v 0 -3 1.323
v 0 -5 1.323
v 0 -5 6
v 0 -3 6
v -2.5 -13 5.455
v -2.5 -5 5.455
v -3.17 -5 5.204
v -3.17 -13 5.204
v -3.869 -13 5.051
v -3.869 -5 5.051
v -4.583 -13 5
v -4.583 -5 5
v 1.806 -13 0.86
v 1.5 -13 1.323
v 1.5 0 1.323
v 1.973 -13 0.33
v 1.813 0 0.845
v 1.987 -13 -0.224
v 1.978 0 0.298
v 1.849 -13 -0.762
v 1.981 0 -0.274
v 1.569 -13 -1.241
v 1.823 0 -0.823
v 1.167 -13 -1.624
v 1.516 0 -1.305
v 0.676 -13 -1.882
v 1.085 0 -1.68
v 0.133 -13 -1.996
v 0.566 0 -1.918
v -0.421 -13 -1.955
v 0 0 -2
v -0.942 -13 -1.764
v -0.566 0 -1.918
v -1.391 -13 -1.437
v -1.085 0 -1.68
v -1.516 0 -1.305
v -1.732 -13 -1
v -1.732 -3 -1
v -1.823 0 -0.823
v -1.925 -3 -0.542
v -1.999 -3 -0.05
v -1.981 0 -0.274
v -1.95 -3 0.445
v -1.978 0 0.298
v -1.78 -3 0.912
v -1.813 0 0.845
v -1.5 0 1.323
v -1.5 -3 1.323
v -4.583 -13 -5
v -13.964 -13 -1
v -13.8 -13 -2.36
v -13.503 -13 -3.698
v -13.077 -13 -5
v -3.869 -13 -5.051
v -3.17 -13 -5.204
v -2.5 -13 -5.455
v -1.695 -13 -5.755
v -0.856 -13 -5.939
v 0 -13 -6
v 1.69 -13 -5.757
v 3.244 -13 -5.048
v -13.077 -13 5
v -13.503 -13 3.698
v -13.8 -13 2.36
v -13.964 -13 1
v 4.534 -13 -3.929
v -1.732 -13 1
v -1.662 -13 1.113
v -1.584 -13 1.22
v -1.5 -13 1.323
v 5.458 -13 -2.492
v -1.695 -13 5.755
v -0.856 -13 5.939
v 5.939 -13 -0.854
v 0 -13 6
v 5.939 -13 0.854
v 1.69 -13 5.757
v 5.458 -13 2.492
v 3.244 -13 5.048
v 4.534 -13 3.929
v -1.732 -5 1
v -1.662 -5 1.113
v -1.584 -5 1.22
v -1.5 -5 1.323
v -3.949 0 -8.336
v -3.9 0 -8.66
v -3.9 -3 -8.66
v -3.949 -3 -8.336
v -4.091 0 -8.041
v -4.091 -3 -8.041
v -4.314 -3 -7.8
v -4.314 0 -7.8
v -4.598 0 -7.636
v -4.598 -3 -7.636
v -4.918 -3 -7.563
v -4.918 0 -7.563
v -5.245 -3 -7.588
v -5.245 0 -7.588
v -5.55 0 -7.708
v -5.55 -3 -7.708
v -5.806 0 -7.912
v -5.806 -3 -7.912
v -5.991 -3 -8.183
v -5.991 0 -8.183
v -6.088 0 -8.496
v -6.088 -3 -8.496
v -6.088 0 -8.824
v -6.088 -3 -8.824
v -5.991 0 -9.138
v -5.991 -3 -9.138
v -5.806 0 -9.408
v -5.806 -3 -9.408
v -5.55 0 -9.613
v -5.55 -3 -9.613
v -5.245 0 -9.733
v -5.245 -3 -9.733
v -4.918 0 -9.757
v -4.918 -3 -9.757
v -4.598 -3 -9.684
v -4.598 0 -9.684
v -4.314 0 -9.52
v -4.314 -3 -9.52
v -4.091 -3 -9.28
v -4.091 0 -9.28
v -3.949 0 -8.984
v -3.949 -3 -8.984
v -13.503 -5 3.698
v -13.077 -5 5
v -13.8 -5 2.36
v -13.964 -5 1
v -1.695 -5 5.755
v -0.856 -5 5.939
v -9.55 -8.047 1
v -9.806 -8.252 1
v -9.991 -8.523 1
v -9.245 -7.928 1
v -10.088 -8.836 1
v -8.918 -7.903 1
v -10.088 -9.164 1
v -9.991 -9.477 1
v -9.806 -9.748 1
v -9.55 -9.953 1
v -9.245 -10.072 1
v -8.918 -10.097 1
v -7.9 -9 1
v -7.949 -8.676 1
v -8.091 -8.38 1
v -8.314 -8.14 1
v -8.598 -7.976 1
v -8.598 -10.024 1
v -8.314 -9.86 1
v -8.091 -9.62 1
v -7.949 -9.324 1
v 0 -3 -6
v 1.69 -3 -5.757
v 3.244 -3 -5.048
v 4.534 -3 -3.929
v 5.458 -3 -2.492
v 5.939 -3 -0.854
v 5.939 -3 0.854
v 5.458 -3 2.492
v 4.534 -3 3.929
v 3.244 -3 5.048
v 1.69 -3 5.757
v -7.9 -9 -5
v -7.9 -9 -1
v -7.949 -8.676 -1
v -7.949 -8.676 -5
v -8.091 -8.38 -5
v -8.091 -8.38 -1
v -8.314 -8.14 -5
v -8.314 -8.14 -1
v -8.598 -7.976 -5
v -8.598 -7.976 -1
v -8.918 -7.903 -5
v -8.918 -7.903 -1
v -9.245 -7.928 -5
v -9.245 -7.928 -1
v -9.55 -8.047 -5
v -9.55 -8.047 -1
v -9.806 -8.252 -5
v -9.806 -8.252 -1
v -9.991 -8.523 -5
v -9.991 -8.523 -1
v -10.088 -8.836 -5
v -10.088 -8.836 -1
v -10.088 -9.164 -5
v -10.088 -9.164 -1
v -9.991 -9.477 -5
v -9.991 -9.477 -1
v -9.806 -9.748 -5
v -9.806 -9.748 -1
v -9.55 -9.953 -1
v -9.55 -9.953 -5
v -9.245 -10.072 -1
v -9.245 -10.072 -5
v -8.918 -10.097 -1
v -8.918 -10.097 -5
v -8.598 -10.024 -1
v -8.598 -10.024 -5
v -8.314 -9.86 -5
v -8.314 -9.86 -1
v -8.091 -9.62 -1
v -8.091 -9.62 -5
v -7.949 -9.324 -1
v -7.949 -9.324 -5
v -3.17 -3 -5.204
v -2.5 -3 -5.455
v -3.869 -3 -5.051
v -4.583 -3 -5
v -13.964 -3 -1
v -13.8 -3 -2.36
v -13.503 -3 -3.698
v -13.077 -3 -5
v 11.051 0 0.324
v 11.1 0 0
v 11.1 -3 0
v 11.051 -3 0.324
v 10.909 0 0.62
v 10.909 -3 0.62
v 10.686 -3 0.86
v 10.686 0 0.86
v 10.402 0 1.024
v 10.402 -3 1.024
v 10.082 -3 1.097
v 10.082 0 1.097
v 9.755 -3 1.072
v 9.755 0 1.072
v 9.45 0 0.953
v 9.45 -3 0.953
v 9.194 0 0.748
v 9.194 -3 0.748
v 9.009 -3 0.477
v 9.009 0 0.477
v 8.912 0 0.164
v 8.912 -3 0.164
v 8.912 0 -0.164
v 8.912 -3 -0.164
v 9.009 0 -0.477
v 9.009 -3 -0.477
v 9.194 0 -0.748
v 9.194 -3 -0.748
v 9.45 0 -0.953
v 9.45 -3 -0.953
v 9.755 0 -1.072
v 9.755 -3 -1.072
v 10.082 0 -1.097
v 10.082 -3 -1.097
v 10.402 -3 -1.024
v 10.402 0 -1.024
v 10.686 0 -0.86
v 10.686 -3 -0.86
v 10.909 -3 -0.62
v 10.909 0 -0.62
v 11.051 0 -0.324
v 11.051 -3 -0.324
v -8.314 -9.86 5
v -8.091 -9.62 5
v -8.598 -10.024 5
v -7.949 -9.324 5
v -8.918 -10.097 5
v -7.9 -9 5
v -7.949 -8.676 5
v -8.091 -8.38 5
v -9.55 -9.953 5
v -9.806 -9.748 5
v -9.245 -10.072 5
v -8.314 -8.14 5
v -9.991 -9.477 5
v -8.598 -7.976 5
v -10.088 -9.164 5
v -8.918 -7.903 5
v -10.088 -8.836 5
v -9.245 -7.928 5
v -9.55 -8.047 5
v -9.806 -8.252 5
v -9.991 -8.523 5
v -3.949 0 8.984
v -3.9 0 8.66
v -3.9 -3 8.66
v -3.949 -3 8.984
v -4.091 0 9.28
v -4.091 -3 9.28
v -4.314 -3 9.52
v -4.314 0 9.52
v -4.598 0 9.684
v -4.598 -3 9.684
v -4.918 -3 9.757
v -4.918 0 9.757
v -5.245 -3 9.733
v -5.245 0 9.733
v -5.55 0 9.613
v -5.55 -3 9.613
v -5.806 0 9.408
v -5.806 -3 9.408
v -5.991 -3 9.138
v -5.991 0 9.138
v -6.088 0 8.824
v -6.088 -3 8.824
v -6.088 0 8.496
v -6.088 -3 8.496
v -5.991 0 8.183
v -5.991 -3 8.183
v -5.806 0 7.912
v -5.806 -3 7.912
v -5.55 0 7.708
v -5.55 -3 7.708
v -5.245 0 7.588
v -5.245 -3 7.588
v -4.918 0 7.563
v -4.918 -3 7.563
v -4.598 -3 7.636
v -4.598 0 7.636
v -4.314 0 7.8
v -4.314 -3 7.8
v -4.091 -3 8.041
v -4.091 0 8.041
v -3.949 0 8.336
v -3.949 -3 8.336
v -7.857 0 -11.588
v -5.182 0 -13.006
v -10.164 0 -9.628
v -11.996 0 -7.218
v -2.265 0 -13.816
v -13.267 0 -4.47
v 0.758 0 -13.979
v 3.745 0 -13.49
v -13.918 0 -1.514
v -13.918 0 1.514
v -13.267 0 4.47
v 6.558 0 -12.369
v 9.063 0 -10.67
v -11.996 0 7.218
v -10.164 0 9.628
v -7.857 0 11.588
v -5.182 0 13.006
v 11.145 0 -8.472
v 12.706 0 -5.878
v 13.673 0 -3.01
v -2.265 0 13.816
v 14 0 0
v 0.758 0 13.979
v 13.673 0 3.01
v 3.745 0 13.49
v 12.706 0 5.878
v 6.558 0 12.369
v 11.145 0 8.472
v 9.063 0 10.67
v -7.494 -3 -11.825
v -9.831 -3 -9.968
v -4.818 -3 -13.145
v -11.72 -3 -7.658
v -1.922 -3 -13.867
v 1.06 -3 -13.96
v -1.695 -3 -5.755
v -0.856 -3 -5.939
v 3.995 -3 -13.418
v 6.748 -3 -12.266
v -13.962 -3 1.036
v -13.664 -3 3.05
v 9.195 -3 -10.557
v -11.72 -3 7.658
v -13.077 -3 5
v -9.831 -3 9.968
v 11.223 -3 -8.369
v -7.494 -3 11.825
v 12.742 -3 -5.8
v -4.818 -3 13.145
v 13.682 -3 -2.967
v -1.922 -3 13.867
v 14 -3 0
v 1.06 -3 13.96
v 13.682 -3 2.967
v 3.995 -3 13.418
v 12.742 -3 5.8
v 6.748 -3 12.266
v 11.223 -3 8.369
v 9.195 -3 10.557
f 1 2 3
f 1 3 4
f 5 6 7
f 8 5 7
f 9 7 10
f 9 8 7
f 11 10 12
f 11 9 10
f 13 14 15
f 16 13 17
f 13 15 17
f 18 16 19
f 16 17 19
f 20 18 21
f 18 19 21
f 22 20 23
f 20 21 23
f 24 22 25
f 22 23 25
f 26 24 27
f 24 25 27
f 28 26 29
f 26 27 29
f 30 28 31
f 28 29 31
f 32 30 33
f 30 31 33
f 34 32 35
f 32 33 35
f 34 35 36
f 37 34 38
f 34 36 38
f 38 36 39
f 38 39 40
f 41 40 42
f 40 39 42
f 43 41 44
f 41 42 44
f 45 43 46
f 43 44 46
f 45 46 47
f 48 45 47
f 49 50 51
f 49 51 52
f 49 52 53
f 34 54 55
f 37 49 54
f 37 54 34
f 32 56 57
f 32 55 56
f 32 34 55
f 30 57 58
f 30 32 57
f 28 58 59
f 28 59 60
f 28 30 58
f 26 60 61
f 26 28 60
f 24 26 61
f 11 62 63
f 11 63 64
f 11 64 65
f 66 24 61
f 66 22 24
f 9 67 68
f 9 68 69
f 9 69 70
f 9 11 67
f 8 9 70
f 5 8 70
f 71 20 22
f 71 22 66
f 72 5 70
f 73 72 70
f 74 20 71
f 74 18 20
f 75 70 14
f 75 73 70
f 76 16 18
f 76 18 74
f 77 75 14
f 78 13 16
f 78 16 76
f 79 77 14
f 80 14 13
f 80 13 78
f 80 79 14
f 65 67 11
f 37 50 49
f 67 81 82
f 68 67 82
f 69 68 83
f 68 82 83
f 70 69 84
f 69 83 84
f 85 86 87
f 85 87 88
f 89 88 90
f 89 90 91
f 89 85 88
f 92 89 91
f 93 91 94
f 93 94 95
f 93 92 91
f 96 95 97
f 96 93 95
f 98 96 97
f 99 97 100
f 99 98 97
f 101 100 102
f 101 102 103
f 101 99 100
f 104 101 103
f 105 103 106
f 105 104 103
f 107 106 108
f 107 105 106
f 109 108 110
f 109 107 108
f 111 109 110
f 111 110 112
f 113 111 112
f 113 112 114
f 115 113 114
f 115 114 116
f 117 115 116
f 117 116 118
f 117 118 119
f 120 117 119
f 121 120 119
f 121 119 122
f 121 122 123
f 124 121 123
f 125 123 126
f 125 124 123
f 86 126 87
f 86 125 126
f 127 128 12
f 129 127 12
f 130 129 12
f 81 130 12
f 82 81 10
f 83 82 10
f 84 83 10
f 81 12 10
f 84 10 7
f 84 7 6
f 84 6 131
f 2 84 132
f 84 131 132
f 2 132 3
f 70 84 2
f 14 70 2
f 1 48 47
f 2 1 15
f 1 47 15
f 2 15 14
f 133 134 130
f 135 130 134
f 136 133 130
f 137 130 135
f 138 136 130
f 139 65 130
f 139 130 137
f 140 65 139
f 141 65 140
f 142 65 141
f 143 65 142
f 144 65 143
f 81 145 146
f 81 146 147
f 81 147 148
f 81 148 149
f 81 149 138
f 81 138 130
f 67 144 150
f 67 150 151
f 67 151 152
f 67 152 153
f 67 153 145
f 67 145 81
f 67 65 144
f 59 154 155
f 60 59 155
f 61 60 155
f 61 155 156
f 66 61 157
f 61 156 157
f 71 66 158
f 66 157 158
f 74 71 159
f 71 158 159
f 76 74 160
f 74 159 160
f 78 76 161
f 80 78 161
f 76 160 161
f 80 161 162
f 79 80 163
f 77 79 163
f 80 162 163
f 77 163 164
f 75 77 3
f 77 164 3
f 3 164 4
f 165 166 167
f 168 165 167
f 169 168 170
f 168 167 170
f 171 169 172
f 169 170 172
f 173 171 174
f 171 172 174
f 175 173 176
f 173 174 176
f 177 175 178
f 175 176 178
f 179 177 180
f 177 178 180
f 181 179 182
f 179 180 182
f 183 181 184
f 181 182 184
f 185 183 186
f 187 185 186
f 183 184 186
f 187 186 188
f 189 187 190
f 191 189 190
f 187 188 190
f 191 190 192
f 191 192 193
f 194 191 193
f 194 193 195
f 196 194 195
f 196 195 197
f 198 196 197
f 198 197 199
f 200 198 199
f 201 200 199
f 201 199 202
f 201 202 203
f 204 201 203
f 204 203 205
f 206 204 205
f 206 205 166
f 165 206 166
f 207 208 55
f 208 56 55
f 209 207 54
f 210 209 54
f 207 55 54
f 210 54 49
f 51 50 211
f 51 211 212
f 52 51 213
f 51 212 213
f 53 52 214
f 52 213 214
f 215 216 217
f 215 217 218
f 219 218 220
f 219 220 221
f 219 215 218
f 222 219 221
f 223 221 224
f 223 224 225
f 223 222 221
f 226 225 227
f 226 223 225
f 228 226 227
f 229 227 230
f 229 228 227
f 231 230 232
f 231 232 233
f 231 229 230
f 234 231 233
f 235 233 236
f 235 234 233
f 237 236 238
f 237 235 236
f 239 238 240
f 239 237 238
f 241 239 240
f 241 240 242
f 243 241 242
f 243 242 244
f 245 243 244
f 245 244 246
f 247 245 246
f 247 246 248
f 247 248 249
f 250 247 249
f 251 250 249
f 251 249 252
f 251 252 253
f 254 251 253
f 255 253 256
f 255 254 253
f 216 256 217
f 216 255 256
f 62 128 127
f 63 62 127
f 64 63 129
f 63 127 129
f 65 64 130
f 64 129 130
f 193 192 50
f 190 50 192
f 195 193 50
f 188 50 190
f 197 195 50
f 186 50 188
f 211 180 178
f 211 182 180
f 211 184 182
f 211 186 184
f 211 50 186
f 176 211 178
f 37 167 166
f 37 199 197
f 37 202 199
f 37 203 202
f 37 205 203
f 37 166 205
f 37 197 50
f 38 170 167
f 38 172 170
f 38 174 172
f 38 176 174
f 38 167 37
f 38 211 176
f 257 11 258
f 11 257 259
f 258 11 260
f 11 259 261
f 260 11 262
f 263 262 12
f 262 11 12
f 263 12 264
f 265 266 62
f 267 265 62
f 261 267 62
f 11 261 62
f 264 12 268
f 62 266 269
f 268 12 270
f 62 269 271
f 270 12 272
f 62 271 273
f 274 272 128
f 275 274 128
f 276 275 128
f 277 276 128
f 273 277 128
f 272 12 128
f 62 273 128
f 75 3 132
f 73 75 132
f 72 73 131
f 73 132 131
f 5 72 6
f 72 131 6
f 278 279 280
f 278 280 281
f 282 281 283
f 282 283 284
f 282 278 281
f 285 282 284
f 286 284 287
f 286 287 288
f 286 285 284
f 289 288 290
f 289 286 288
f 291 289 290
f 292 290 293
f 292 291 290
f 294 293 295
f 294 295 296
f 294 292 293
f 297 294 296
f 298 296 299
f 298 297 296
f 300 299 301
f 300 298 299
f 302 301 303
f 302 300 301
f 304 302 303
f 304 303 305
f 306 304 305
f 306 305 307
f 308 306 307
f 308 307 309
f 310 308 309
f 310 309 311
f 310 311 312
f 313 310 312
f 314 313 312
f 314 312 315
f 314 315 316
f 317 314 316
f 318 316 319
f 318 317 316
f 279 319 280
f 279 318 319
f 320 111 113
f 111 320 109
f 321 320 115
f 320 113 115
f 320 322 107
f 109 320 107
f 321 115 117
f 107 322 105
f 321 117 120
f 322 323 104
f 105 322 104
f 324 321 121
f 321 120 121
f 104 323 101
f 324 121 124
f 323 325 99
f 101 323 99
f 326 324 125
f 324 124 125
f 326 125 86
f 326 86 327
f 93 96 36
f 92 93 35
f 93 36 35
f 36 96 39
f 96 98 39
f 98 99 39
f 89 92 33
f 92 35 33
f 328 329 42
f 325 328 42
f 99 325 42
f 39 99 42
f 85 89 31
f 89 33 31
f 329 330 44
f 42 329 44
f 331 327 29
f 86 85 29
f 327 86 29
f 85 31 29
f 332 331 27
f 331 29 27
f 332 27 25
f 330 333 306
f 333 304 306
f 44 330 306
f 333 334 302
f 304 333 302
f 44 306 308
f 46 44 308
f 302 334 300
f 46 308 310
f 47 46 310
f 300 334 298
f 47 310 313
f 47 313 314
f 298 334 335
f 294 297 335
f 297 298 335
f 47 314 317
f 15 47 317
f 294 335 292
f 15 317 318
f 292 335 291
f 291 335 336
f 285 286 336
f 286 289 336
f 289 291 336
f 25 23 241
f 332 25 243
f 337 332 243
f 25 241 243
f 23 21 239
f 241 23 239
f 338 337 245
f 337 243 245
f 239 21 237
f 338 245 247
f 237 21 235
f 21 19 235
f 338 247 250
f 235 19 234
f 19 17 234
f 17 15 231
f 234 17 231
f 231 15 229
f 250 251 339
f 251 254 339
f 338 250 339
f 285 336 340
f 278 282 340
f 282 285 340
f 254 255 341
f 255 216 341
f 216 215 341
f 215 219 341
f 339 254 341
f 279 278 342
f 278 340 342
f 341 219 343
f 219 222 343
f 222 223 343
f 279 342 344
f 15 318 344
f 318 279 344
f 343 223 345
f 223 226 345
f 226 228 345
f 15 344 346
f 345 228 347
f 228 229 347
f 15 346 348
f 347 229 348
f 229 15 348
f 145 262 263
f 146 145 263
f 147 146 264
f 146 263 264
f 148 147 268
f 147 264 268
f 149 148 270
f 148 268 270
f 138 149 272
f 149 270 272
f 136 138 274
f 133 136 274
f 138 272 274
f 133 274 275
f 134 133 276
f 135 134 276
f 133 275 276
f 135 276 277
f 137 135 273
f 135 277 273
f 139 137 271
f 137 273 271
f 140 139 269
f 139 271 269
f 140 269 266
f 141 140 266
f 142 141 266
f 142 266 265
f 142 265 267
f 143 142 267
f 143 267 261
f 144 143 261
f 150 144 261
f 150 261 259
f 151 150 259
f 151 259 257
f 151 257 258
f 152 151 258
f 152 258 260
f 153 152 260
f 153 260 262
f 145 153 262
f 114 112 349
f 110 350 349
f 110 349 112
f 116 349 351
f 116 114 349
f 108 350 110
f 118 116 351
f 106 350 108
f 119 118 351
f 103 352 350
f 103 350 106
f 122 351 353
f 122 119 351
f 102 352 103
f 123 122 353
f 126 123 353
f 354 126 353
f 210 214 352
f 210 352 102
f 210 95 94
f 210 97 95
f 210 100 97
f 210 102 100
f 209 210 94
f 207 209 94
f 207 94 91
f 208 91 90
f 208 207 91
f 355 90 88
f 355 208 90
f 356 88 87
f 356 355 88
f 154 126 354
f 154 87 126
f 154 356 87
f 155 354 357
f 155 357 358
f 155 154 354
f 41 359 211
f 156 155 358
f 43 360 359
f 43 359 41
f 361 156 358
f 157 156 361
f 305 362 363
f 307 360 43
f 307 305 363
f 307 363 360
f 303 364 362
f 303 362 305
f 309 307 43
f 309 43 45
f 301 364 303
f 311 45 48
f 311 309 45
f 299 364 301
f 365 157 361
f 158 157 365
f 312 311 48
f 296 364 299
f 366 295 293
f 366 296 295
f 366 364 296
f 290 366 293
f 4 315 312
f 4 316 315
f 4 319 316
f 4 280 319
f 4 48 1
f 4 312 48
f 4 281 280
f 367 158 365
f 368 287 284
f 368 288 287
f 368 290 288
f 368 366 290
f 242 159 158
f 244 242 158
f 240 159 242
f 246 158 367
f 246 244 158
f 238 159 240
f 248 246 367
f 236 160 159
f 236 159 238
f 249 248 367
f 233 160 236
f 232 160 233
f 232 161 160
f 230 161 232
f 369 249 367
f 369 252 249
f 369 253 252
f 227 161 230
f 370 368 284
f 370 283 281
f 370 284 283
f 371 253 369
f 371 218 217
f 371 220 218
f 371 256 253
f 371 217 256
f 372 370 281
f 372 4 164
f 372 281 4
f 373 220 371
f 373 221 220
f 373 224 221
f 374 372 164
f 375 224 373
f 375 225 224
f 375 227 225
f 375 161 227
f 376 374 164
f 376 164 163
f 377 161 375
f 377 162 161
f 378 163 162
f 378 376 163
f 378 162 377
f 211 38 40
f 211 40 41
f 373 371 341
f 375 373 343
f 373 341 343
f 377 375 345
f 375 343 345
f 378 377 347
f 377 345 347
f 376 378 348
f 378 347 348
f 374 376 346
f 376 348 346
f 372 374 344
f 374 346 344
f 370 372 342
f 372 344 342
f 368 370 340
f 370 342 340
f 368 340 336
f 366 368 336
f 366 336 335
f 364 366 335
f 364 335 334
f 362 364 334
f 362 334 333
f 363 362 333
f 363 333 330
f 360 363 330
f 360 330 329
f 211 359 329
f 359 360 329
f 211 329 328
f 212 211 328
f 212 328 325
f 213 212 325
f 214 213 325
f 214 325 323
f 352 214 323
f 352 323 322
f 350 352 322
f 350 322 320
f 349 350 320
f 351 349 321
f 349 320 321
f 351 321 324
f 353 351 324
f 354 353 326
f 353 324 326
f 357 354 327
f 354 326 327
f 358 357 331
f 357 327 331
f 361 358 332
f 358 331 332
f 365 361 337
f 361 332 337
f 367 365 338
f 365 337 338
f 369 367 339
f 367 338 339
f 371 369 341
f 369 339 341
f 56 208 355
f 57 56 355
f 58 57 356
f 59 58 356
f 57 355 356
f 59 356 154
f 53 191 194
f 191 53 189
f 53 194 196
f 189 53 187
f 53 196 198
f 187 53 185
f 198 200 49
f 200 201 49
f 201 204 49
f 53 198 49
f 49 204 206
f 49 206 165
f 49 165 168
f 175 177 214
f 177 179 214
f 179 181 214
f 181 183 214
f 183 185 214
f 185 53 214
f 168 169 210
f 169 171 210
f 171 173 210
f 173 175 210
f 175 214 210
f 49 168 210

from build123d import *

# Parameters (mm, degrees)
F0_R      = 14
F0_R_2    = 1.1
F1_DEPTH  = 3
F3_DEPTH  = 10
F5_DEPTH  = 13.001
F6_W      = 14
F6_H      = 2
F7_DEPTH  = 6
F8_W      = 14
F8_H      = 2
F9_DEPTH  = 8
F10_R     = 3
F11_DEPTH = 10
F12_R     = 5
F13_R     = 5
F14_R     = 1.1
F15_DEPTH = 19.001


# Not quite as in the source:
# - a feature names something its author has since deleted; it is built from what else it names


with BuildPart() as f1:
    # F0 (on Front) → F1 (new body)
    with BuildSketch(Plane.XZ):
        Circle(F0_R)
        with Locations((-5, -8.6602540378)):
            Circle(F0_R_2, mode=Mode.SUBTRACT)
        with Locations((-5, 8.6602540378)):
            Circle(F0_R_2, mode=Mode.SUBTRACT)
        with Locations((10, 0)):
            Circle(F0_R_2, mode=Mode.SUBTRACT)
    extrude(amount=F1_DEPTH)

    # F2 (on face) → F3 (join)
    with BuildSketch(Plane.XZ.offset(3)):
        with BuildLine():
            ThreePointArc((-3.3166247904, -5), (-1.7320508076, -5.7445626465), (0, -6))
            ThreePointArc((0, -6), (6, 0), (0, 6))
            ThreePointArc((0, 6), (-1.7320508076, 5.7445626465), (-3.3166247904, 5))
            Line((-3.3166247904, 5), (-13.0766968306, 5))
            ThreePointArc((-13.0766968306, 5), (-14, 0), (-13.0766968306, -5))
            Line((-13.0766968306, -5), (-3.3166247904, -5))
        make_face()
    extrude(amount=F3_DEPTH)

    # F4 (on face) → F5 (cut, through all)
    with BuildSketch(Plane(origin=(0, 0, 0), x_dir=(-1, 0, 0), z_dir=(0, 1, 0))):
        with BuildLine():
            Line((1.5, 1.3228756555), (-1.5, 1.3228756555))
            ThreePointArc((-1.5, 1.3228756555), (0, -2), (1.5, 1.3228756555))
        make_face()
    extrude(amount=-F5_DEPTH, mode=Mode.SUBTRACT)

    # F6 (on face) → F7 (cut, symmetric)
    with BuildSketch(Plane.XY.offset(5)):
        with Locations((-7, -4)):
            Rectangle(F6_W, F6_H)
    extrude(amount=F7_DEPTH, both=True, mode=Mode.SUBTRACT)

    # F8 (on face) → F9 (cut)
    with BuildSketch(Plane.XZ.offset(13)):
        with Locations((-7, 0)):
            Rectangle(F8_W, F8_H)
    extrude(amount=-F9_DEPTH, mode=Mode.SUBTRACT)

    # F10 (on face) → F11 (cut)
    with BuildSketch(Plane.XZ.offset(3)):
        with Locations((-5, 8.6602540378)):
            Circle(F10_R)
    extrude(amount=F11_DEPTH, mode=Mode.SUBTRACT)

    # F12
    f12_edges = [f1.edges().sort_by_distance(p)[0] for p in [
        (-3.316625, -9, 5),
    ]]
    fillet(f12_edges, radius=F12_R)

    # F13
    f13_edges = [f1.edges().sort_by_distance(p)[0] for p in [
        (-3.316625, -8, -5),
    ]]
    fillet(f13_edges, radius=F13_R)

    # F14 (on face) → F15 (cut, through all)
    with BuildSketch(Plane.XY.offset(5)):
        with Locations((-9, -9)):
            Circle(F14_R)
    extrude(amount=-F15_DEPTH, mode=Mode.SUBTRACT)


solid = f1.part
